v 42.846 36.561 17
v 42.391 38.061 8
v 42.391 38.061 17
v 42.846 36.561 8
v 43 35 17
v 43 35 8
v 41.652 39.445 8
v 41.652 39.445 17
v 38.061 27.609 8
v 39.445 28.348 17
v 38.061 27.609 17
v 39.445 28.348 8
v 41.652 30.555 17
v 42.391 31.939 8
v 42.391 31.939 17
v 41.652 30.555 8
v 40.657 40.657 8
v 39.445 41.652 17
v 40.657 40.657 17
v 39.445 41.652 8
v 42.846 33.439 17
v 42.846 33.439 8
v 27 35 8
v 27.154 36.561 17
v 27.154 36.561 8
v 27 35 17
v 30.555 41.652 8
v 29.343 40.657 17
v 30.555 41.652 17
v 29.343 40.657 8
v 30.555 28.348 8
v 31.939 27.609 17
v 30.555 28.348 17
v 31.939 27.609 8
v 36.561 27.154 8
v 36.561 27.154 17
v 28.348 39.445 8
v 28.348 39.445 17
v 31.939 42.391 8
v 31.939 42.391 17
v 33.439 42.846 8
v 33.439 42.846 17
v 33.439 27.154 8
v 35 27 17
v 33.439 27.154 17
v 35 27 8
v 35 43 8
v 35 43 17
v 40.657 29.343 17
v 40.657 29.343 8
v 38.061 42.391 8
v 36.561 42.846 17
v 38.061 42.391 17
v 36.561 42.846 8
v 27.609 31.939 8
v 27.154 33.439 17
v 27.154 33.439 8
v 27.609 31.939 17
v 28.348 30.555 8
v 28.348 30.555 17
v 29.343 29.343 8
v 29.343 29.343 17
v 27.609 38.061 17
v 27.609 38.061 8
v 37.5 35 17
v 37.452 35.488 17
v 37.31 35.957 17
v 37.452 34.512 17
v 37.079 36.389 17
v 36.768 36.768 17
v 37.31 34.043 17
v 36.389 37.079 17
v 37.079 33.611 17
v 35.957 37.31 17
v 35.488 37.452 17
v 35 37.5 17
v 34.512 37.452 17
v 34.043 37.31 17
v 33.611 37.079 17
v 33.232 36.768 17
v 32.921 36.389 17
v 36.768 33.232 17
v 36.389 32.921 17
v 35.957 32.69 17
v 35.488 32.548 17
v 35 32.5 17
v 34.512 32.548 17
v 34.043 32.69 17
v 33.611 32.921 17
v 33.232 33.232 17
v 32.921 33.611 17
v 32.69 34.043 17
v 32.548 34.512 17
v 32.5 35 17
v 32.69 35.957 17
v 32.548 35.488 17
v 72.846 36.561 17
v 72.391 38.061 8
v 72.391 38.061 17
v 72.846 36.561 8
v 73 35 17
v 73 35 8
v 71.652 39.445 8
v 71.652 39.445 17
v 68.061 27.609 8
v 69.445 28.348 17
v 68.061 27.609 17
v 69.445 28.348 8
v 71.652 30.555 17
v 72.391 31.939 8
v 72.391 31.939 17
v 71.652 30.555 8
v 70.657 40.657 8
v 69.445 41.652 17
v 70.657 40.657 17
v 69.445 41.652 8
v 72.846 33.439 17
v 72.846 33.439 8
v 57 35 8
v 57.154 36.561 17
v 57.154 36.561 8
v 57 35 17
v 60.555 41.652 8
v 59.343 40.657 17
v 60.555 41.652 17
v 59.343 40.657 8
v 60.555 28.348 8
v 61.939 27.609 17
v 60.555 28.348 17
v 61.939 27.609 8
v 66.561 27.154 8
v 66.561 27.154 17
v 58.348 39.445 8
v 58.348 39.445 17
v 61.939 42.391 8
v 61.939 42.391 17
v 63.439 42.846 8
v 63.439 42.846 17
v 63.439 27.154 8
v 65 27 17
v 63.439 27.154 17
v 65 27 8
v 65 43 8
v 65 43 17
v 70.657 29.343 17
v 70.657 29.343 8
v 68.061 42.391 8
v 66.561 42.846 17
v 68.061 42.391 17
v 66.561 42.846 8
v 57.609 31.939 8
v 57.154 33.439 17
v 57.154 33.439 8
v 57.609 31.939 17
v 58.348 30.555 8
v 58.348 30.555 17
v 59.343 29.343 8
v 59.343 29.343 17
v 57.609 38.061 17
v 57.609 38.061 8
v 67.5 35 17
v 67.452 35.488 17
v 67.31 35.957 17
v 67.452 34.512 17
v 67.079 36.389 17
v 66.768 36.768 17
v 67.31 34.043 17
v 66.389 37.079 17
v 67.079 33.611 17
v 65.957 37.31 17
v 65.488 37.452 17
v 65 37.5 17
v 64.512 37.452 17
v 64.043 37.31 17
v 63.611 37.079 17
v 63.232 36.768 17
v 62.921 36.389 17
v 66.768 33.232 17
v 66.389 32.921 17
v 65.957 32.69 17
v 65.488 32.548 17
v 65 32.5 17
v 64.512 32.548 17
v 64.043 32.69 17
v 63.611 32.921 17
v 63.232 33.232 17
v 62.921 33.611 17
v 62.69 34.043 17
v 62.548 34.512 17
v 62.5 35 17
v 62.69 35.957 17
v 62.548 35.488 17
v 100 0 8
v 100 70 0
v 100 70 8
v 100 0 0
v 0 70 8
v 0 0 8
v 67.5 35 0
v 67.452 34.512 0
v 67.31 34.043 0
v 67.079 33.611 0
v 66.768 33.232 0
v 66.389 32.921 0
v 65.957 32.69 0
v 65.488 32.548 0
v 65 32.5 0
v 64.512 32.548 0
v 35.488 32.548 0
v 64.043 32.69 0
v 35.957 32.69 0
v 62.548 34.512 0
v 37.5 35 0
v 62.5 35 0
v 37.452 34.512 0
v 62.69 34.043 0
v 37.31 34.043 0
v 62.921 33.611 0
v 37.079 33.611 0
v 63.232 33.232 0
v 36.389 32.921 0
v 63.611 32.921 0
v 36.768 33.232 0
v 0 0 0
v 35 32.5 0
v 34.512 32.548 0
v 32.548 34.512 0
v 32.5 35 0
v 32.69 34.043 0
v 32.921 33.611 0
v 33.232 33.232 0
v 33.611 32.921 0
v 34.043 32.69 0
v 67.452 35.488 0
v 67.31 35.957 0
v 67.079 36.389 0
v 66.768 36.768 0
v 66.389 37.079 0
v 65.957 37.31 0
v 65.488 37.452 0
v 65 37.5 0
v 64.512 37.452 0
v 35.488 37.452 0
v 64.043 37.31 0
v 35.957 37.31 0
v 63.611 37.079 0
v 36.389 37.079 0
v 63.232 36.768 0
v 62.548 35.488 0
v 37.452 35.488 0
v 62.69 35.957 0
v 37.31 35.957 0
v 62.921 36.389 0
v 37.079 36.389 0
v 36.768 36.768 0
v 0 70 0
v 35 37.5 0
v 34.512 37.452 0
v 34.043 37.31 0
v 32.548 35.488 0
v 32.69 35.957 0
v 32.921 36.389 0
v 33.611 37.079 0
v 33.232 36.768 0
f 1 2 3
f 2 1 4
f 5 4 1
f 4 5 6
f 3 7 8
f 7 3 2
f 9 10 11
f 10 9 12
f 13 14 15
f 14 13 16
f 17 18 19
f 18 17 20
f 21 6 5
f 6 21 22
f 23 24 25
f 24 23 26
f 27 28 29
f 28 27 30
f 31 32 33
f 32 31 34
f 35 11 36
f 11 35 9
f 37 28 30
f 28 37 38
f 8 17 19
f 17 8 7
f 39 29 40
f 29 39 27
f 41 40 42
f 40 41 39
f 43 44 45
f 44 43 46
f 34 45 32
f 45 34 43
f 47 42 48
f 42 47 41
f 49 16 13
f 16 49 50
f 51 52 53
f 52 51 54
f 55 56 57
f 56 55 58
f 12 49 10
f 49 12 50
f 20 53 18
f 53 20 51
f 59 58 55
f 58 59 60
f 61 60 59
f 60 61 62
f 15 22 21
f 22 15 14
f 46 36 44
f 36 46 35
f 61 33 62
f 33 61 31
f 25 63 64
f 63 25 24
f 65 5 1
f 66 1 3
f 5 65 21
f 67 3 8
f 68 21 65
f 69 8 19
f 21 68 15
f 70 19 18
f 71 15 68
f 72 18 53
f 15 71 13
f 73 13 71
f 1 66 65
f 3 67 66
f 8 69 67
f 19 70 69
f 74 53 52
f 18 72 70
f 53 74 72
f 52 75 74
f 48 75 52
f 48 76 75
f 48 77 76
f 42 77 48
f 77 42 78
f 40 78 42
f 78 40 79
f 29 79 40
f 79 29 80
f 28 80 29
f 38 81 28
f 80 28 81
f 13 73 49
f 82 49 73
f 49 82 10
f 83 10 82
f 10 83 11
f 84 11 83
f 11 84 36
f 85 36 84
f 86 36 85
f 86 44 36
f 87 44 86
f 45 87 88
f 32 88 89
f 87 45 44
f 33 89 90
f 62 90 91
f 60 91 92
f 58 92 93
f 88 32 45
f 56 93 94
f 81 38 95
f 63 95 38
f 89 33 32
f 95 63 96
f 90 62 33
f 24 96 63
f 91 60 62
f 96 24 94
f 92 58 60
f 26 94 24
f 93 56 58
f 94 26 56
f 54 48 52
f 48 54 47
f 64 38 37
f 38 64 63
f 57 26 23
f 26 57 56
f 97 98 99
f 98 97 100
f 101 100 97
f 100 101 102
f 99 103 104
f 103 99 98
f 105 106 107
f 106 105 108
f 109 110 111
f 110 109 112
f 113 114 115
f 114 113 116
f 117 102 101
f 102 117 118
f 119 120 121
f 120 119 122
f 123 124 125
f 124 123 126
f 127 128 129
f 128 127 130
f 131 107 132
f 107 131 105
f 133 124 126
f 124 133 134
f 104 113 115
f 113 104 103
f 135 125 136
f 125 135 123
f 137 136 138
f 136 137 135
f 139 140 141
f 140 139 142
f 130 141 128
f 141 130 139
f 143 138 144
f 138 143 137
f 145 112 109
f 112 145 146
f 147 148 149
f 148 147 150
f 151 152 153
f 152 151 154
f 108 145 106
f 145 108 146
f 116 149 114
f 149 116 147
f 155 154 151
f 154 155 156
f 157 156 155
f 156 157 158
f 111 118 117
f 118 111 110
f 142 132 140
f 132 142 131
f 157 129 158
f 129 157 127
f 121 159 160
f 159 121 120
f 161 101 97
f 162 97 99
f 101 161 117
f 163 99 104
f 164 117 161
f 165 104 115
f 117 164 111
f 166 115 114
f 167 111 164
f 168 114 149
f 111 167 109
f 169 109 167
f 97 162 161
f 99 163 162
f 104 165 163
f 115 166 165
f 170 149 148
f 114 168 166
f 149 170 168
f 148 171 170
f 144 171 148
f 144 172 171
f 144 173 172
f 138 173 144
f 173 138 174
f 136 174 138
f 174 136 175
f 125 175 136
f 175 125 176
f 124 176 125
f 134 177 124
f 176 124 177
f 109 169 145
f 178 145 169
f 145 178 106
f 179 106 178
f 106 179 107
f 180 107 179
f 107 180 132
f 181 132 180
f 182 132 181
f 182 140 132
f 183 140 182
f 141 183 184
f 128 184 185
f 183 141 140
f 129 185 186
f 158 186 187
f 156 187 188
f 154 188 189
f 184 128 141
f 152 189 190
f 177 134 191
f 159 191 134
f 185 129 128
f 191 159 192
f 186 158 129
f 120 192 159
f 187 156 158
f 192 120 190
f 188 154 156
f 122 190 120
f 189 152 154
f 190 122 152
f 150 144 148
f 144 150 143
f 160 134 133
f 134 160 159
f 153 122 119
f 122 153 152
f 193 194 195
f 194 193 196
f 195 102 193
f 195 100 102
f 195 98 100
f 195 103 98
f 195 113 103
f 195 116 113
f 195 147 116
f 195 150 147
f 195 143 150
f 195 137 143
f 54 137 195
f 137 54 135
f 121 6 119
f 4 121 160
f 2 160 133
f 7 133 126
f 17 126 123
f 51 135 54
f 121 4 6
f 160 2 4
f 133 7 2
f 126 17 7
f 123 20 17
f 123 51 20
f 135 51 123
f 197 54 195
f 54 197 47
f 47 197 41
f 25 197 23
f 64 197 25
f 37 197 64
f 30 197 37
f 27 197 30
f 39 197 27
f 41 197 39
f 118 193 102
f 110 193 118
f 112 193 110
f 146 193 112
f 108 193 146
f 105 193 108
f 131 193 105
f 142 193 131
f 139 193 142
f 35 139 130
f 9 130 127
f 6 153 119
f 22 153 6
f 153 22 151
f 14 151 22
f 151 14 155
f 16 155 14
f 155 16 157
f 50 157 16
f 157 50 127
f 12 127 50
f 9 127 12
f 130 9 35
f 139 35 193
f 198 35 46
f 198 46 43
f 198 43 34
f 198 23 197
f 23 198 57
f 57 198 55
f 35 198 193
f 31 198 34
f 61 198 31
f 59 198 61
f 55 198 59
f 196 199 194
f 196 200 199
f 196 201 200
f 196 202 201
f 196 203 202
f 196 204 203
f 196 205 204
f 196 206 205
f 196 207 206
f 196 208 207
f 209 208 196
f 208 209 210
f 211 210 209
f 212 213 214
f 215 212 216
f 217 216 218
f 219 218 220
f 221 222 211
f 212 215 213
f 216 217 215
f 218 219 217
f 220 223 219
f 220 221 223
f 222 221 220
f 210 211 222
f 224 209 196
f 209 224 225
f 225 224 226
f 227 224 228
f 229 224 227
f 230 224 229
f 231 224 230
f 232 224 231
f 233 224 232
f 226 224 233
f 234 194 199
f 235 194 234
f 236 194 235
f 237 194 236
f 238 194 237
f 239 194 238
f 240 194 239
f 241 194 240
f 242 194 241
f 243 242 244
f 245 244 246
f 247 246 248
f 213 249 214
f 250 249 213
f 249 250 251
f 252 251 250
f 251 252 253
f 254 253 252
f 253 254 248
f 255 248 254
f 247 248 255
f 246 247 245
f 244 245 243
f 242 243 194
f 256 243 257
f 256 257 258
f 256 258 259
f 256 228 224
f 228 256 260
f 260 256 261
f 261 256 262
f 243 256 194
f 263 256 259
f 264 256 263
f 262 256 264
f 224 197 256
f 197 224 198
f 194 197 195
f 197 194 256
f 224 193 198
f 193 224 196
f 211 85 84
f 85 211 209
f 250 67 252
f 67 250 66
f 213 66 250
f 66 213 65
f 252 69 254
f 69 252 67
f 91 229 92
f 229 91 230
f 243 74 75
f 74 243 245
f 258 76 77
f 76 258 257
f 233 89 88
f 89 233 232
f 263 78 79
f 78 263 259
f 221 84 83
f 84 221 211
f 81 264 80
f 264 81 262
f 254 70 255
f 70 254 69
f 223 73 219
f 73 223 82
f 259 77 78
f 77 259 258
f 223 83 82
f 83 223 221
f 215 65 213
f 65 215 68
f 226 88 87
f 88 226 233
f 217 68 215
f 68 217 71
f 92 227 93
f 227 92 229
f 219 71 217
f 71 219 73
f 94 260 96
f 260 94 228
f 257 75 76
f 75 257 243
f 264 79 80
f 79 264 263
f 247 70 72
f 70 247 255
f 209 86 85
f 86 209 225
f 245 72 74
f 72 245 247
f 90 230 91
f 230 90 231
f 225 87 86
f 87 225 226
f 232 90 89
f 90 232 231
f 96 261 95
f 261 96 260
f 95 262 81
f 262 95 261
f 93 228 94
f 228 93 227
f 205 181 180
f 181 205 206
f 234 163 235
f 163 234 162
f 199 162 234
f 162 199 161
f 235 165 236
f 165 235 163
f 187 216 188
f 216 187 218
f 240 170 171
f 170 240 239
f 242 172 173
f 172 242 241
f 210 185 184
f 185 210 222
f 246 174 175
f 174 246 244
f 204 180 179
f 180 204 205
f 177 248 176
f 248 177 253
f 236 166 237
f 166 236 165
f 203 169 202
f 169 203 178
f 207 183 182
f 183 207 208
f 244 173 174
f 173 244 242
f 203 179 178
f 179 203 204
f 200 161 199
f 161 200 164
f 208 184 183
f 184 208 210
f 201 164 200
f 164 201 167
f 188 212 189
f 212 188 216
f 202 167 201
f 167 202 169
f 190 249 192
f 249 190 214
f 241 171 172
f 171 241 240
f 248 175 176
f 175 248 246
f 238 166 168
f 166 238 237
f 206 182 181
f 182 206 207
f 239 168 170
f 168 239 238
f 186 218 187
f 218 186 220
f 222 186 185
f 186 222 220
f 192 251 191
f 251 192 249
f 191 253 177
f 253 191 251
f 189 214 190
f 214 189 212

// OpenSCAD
$fn = 32;

// ----------------------------------------------------------------------
// Drill jig: two_boss jig
// ----------------------------------------------------------------------

// --- parameters (mm) ---
plate_l = 100;            // plate length, X
plate_w = 70;             // plate width, Y
plate_t = 8;              // plate thickness
boss_d = 16;              // guide boss diameter
boss_h = 10;              // boss height above the plate
guide_d = 5;              // guide hole diameter
boss_pitch = 30;          // boss pitch

n_boss = 2;  // guide bosses
boss_x0 = (plate_l - (n_boss - 1) * boss_pitch) / 2;  // first boss X
boss_top = plate_t - 1 + boss_h;  // boss crown height
total_h = boss_top;  // overall height

difference() {
  union() {
  cube([plate_l, plate_w, plate_t]);
  for (i = [0 : n_boss - 1])
    translate([boss_x0 + i * boss_pitch, plate_w / 2, plate_t - 1])
      cylinder(h = boss_h, d = boss_d);
  }
  for (i = [0 : n_boss - 1])
    translate([boss_x0 + i * boss_pitch, plate_w / 2, -1])
      cylinder(h = plate_t + boss_h, d = guide_d);
}
